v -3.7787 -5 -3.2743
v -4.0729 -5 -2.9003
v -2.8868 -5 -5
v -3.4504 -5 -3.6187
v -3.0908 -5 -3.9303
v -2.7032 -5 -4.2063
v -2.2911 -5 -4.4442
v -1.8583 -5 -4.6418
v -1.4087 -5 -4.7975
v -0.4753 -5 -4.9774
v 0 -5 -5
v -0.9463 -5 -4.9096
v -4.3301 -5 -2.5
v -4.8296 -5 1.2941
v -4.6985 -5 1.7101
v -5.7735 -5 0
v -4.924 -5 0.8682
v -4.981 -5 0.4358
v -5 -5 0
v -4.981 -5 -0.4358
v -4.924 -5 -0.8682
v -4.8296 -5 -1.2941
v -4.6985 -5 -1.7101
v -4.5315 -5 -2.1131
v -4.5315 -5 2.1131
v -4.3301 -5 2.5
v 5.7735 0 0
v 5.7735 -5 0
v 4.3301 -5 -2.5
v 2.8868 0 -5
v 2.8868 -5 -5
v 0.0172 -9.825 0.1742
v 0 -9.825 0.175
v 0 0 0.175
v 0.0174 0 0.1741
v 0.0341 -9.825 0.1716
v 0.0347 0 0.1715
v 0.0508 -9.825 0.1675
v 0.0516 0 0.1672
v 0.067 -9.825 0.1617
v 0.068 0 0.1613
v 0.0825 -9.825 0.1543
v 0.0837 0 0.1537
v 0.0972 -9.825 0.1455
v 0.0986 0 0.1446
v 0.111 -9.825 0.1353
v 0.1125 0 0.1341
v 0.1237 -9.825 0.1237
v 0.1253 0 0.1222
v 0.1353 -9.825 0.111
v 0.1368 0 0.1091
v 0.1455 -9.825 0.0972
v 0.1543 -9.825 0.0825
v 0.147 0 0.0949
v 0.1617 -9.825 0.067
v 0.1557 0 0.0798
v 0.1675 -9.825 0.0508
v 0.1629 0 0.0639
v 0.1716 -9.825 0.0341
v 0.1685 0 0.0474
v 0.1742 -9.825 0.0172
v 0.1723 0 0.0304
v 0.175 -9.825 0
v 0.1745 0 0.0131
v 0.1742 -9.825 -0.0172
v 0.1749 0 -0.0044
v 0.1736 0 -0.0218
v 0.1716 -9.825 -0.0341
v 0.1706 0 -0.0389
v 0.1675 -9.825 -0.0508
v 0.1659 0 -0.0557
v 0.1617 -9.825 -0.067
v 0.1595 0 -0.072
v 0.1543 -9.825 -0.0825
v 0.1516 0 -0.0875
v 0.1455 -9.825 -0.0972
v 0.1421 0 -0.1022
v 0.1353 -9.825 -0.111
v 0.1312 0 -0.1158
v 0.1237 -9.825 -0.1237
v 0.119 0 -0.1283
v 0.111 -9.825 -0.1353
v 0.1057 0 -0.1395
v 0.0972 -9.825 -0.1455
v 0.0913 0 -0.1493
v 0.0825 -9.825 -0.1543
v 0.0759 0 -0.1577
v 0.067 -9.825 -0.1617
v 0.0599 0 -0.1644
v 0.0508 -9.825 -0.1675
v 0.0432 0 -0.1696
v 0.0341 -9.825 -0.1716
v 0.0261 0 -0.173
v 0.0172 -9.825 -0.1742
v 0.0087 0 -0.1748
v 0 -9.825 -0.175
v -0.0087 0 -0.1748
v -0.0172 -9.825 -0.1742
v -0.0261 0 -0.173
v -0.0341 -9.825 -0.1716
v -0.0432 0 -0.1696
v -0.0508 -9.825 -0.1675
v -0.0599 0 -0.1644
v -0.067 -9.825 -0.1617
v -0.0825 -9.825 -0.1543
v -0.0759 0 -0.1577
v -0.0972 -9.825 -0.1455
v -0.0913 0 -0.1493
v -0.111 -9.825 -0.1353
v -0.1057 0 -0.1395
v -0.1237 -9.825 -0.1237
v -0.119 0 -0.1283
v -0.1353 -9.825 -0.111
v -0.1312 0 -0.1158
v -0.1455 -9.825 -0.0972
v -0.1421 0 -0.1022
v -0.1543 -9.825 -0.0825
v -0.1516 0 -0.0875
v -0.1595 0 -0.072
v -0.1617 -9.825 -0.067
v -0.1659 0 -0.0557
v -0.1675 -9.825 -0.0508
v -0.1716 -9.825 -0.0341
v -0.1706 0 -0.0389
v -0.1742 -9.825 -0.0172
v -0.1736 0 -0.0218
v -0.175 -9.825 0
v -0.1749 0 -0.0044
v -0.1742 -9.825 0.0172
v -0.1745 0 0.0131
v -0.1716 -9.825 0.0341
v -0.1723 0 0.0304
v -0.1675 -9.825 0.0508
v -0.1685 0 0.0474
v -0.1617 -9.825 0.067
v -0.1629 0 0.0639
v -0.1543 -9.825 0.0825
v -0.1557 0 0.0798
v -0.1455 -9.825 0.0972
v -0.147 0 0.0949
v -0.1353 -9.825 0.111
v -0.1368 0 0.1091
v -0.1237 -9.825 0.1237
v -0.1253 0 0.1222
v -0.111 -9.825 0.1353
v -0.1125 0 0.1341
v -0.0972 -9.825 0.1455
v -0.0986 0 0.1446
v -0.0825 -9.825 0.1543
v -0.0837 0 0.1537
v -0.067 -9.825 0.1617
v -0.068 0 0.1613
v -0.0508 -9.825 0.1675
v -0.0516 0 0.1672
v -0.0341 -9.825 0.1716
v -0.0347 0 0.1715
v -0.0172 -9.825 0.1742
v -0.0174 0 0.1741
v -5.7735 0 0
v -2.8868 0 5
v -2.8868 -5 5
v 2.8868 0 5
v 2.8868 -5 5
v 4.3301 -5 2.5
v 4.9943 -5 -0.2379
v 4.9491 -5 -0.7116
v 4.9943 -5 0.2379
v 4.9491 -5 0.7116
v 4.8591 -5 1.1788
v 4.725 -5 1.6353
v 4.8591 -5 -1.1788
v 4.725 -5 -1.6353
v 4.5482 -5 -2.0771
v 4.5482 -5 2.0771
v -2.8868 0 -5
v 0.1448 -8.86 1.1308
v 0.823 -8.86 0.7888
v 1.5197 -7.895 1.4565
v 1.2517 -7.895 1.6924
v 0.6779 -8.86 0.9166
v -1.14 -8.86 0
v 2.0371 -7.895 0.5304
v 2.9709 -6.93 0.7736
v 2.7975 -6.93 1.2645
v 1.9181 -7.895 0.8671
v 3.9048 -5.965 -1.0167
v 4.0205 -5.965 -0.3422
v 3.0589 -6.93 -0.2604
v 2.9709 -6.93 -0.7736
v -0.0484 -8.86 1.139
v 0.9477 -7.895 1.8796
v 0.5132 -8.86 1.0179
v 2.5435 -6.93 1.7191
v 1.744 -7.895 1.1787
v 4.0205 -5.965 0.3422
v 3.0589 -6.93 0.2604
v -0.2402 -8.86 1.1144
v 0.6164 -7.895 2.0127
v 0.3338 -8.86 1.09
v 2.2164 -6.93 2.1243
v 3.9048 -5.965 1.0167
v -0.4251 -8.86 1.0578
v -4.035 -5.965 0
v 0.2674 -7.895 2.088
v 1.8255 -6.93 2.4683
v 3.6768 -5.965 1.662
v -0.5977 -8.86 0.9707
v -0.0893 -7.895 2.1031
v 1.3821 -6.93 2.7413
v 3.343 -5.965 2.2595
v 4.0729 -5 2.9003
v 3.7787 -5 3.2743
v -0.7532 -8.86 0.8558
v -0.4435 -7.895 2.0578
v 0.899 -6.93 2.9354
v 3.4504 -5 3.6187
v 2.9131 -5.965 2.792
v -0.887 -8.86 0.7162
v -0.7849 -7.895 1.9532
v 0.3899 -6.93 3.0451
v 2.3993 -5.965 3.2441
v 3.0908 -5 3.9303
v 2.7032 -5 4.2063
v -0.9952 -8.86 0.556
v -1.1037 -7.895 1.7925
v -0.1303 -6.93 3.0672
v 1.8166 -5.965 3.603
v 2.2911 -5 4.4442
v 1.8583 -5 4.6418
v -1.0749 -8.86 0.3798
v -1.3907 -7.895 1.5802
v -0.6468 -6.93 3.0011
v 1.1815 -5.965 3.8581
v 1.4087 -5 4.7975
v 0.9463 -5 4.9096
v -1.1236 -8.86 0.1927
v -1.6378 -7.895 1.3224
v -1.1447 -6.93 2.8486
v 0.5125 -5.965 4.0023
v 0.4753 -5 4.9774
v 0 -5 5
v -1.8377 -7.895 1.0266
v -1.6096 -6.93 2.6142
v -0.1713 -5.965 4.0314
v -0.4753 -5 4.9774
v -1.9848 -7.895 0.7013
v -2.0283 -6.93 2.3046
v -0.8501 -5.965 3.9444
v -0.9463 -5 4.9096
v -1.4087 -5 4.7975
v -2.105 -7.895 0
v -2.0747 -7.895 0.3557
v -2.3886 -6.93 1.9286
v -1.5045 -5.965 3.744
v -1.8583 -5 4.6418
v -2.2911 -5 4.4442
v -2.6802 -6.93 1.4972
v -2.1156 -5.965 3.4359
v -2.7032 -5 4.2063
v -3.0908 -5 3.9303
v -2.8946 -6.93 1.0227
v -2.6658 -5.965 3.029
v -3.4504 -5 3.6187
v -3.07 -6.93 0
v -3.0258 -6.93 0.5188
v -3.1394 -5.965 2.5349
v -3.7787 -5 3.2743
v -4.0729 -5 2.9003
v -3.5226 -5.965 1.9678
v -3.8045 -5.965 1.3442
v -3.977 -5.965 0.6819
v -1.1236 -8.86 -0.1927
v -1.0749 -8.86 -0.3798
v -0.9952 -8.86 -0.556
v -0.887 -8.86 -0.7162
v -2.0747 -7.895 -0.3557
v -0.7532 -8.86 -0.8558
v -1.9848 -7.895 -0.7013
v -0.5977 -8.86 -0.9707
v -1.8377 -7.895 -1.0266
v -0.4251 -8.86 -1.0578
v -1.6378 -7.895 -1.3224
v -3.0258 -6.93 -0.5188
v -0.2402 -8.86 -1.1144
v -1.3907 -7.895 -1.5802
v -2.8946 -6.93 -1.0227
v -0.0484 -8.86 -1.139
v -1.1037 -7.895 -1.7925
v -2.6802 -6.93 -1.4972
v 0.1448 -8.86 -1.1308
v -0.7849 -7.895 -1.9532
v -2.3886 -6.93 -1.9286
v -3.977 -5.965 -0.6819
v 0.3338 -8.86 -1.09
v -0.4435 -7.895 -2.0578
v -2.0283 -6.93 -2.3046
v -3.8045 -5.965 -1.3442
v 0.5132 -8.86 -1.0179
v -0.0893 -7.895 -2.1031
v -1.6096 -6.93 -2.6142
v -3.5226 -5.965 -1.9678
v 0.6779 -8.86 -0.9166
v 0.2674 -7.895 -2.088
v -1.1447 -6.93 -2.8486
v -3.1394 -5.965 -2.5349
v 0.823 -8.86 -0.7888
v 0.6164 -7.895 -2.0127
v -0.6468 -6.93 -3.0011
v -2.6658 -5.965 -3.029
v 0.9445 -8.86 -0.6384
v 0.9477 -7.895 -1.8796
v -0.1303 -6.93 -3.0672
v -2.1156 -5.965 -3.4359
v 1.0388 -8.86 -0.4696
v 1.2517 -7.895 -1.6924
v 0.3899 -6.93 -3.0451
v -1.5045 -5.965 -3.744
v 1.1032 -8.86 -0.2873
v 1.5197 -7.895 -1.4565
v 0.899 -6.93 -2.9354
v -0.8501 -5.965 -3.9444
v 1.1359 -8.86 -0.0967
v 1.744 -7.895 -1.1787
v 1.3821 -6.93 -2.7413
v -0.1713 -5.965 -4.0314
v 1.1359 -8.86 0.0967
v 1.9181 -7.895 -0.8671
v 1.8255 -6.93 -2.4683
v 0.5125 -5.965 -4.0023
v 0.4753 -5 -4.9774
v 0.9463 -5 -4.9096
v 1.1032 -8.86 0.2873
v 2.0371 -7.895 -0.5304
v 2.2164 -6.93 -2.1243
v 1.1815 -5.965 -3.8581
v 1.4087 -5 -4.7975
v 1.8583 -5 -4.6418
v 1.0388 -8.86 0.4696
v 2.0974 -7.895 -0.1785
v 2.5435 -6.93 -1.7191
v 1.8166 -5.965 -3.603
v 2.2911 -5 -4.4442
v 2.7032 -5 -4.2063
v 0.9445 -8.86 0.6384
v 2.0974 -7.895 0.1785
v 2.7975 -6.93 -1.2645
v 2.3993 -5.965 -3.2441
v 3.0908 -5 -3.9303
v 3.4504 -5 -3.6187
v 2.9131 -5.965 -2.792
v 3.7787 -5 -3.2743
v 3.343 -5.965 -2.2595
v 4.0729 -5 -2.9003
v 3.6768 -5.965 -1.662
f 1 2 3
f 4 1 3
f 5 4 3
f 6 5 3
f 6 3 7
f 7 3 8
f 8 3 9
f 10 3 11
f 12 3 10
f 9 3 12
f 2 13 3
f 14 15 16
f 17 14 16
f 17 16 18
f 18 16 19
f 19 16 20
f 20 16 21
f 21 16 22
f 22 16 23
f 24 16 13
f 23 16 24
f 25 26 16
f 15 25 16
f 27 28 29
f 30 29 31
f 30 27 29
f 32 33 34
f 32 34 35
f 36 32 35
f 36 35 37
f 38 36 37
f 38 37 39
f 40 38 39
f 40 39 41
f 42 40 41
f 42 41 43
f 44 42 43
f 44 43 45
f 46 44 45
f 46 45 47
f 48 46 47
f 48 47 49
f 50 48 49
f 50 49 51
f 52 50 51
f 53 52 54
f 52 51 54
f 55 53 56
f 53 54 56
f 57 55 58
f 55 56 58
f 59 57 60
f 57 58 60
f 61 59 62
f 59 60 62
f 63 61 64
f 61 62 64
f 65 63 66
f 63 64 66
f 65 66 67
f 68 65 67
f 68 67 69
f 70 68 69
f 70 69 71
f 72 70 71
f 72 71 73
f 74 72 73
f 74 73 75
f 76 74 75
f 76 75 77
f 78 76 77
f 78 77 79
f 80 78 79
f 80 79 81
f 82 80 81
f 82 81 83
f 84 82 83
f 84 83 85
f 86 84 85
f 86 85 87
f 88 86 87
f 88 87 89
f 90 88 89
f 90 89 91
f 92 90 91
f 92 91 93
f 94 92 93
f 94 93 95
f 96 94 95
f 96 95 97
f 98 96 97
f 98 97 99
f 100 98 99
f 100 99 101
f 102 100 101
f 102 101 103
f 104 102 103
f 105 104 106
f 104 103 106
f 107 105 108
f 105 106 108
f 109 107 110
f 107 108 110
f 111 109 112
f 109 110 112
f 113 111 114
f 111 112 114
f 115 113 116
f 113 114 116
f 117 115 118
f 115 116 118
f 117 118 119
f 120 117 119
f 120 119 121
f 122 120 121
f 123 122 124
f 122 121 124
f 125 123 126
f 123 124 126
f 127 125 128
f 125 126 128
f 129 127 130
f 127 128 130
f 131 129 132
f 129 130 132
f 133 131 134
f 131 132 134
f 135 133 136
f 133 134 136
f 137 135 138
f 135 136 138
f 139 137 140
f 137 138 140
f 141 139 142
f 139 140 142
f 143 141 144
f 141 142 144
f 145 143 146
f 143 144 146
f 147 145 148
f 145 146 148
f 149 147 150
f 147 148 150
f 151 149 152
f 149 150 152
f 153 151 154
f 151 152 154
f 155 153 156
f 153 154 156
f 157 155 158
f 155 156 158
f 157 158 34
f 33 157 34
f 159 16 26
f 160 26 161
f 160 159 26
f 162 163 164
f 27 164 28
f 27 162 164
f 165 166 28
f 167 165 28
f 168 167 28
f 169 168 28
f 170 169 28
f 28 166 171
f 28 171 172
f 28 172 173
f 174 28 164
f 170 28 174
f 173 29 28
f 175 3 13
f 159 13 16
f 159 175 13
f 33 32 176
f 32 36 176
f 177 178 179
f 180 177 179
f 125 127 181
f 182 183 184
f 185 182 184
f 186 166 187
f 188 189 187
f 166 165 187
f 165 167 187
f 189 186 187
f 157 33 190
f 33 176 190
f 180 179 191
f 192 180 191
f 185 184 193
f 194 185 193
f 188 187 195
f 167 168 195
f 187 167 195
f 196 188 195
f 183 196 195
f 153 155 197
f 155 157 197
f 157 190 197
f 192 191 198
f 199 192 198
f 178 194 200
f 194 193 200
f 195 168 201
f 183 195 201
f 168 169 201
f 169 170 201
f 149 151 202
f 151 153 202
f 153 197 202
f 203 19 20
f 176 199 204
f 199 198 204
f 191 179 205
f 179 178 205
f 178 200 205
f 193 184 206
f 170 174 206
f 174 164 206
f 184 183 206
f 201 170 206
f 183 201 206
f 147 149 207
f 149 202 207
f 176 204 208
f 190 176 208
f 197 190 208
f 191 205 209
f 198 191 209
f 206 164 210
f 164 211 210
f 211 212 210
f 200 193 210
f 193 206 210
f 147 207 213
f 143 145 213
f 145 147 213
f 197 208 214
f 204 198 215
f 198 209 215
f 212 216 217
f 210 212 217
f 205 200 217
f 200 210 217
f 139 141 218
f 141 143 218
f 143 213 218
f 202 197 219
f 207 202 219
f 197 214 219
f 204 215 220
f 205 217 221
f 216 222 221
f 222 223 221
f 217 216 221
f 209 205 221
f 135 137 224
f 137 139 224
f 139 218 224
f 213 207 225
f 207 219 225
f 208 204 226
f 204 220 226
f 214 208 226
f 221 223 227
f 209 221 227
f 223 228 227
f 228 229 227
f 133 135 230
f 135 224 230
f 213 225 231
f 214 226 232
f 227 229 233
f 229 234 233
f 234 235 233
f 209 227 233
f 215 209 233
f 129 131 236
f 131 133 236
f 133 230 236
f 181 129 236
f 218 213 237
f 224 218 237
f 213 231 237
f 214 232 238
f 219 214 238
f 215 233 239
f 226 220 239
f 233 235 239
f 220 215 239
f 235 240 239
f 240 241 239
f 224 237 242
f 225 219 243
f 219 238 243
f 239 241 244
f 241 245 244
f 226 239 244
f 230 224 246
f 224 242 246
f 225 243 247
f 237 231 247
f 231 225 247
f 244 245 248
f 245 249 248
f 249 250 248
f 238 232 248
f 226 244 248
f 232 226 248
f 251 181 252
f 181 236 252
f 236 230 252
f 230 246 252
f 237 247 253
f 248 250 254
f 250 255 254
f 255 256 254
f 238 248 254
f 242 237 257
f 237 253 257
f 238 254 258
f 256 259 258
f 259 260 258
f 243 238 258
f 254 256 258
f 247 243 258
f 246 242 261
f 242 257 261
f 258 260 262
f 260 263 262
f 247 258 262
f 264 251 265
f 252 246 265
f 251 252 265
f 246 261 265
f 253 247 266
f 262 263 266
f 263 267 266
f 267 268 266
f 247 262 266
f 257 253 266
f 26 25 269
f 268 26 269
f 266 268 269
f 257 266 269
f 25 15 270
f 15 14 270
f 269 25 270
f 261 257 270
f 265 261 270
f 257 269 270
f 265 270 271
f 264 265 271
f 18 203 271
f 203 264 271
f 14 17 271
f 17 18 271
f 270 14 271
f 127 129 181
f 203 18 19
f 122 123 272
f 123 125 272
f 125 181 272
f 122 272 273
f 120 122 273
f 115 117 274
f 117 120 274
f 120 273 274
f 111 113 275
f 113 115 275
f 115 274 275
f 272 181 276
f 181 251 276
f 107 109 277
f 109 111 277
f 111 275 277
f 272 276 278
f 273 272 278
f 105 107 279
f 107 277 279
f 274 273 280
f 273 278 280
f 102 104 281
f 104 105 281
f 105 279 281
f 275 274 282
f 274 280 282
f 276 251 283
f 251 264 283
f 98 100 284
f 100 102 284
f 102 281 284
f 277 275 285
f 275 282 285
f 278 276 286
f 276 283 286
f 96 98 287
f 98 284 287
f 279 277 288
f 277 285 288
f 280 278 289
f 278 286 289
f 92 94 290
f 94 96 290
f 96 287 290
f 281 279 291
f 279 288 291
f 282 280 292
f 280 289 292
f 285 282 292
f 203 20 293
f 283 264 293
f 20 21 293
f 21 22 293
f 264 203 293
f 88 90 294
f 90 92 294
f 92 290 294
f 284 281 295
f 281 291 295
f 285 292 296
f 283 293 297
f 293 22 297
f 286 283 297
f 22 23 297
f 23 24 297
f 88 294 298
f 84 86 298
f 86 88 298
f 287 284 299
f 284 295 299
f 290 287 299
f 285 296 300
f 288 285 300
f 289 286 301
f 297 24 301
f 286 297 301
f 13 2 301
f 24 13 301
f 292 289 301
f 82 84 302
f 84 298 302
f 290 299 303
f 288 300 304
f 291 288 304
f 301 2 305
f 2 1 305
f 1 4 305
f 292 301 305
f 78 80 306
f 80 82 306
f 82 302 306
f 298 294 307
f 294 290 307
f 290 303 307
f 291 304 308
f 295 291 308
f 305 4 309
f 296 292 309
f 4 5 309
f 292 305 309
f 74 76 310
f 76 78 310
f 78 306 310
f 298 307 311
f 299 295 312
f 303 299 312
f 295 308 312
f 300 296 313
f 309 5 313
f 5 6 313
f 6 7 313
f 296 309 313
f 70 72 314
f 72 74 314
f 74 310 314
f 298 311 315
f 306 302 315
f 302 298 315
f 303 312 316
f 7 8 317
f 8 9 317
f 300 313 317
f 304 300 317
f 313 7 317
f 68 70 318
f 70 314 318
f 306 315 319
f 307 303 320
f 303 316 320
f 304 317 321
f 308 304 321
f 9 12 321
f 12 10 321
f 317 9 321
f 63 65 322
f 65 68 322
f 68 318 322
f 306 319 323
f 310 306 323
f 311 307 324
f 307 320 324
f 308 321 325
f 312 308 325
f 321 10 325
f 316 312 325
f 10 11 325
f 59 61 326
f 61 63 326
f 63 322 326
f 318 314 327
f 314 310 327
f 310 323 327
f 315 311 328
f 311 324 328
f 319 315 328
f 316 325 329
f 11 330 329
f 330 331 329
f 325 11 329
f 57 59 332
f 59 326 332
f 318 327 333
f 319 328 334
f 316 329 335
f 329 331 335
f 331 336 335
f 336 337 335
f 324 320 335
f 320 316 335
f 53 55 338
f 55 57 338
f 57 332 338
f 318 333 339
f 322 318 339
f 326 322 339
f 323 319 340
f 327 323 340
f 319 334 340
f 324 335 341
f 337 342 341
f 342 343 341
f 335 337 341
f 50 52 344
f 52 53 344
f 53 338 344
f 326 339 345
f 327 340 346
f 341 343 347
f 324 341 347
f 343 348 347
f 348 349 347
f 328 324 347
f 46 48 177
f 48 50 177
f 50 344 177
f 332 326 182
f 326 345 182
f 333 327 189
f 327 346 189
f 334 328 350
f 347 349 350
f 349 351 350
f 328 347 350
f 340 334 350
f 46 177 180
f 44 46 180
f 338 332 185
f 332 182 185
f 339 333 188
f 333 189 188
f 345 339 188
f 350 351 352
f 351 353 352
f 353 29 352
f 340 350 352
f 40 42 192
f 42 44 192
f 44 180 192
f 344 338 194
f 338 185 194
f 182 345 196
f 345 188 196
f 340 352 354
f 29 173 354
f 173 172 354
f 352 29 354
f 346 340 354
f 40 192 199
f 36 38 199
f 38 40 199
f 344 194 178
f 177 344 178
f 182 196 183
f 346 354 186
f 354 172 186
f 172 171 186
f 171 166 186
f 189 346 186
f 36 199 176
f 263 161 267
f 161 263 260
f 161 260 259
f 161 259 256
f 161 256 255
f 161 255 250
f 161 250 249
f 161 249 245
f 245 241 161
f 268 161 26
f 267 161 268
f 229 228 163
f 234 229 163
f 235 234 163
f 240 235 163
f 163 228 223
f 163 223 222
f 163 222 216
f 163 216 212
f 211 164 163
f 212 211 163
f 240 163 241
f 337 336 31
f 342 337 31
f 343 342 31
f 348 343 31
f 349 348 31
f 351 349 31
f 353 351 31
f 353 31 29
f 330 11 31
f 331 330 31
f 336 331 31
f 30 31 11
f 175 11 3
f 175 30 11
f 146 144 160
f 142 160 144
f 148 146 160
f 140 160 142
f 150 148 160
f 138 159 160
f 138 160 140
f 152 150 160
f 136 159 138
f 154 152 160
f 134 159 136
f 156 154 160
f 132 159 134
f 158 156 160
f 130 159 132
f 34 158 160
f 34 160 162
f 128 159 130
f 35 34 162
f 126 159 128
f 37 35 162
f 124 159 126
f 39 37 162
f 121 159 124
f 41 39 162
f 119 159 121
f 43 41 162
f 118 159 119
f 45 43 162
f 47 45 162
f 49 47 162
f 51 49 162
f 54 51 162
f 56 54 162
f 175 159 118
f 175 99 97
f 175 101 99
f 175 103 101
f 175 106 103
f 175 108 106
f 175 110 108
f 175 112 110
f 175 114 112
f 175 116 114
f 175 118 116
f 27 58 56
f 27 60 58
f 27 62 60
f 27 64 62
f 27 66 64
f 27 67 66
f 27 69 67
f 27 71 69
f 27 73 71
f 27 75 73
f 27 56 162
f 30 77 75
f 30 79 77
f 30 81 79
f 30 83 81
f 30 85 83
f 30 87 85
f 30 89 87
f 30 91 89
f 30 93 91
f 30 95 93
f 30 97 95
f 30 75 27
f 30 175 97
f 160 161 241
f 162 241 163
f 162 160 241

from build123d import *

# Parameters (mm, degrees)
BOSS_EXTRUDE1_DEPTH = 5
SKETCH4_R           = 0.175
CUT_EXTRUDE1_DEPTH  = 13.583057392


with BuildPart() as part:
    # Sketch1 → Boss-Extrude1 (new body)
    with BuildSketch(Plane(origin=(0, 0, 0), x_dir=(1, 0, 0), z_dir=(0, 1, 0))):
        Polygon((5.773502692, 0), (2.886751346, 5), (-2.886751346, 5), (-5.773502692, 0), (-2.886751346, -5), (2.886751346, -5), align=None)
    extrude(amount=-BOSS_EXTRUDE1_DEPTH)

    # Sketch3 → Revolve1 (revolve)
    with BuildSketch(Plane.XY):
        Polygon((0, -5), (0, -10), (-5, -5), align=None)
    revolve(axis=Axis((0, -5, 0), (0, -1, 0)))

    # Sketch4 → Cut-Extrude1 (cut, through all)
    with BuildSketch(Plane(origin=(0, 0, 0), x_dir=(1, 0, 0), z_dir=(0, 1, 0))):
        with Locations(Location((0, 0, 0), (0, 0, 270))):
            Circle(SKETCH4_R)
    extrude(amount=-CUT_EXTRUDE1_DEPTH, mode=Mode.SUBTRACT)


solid = part.part
